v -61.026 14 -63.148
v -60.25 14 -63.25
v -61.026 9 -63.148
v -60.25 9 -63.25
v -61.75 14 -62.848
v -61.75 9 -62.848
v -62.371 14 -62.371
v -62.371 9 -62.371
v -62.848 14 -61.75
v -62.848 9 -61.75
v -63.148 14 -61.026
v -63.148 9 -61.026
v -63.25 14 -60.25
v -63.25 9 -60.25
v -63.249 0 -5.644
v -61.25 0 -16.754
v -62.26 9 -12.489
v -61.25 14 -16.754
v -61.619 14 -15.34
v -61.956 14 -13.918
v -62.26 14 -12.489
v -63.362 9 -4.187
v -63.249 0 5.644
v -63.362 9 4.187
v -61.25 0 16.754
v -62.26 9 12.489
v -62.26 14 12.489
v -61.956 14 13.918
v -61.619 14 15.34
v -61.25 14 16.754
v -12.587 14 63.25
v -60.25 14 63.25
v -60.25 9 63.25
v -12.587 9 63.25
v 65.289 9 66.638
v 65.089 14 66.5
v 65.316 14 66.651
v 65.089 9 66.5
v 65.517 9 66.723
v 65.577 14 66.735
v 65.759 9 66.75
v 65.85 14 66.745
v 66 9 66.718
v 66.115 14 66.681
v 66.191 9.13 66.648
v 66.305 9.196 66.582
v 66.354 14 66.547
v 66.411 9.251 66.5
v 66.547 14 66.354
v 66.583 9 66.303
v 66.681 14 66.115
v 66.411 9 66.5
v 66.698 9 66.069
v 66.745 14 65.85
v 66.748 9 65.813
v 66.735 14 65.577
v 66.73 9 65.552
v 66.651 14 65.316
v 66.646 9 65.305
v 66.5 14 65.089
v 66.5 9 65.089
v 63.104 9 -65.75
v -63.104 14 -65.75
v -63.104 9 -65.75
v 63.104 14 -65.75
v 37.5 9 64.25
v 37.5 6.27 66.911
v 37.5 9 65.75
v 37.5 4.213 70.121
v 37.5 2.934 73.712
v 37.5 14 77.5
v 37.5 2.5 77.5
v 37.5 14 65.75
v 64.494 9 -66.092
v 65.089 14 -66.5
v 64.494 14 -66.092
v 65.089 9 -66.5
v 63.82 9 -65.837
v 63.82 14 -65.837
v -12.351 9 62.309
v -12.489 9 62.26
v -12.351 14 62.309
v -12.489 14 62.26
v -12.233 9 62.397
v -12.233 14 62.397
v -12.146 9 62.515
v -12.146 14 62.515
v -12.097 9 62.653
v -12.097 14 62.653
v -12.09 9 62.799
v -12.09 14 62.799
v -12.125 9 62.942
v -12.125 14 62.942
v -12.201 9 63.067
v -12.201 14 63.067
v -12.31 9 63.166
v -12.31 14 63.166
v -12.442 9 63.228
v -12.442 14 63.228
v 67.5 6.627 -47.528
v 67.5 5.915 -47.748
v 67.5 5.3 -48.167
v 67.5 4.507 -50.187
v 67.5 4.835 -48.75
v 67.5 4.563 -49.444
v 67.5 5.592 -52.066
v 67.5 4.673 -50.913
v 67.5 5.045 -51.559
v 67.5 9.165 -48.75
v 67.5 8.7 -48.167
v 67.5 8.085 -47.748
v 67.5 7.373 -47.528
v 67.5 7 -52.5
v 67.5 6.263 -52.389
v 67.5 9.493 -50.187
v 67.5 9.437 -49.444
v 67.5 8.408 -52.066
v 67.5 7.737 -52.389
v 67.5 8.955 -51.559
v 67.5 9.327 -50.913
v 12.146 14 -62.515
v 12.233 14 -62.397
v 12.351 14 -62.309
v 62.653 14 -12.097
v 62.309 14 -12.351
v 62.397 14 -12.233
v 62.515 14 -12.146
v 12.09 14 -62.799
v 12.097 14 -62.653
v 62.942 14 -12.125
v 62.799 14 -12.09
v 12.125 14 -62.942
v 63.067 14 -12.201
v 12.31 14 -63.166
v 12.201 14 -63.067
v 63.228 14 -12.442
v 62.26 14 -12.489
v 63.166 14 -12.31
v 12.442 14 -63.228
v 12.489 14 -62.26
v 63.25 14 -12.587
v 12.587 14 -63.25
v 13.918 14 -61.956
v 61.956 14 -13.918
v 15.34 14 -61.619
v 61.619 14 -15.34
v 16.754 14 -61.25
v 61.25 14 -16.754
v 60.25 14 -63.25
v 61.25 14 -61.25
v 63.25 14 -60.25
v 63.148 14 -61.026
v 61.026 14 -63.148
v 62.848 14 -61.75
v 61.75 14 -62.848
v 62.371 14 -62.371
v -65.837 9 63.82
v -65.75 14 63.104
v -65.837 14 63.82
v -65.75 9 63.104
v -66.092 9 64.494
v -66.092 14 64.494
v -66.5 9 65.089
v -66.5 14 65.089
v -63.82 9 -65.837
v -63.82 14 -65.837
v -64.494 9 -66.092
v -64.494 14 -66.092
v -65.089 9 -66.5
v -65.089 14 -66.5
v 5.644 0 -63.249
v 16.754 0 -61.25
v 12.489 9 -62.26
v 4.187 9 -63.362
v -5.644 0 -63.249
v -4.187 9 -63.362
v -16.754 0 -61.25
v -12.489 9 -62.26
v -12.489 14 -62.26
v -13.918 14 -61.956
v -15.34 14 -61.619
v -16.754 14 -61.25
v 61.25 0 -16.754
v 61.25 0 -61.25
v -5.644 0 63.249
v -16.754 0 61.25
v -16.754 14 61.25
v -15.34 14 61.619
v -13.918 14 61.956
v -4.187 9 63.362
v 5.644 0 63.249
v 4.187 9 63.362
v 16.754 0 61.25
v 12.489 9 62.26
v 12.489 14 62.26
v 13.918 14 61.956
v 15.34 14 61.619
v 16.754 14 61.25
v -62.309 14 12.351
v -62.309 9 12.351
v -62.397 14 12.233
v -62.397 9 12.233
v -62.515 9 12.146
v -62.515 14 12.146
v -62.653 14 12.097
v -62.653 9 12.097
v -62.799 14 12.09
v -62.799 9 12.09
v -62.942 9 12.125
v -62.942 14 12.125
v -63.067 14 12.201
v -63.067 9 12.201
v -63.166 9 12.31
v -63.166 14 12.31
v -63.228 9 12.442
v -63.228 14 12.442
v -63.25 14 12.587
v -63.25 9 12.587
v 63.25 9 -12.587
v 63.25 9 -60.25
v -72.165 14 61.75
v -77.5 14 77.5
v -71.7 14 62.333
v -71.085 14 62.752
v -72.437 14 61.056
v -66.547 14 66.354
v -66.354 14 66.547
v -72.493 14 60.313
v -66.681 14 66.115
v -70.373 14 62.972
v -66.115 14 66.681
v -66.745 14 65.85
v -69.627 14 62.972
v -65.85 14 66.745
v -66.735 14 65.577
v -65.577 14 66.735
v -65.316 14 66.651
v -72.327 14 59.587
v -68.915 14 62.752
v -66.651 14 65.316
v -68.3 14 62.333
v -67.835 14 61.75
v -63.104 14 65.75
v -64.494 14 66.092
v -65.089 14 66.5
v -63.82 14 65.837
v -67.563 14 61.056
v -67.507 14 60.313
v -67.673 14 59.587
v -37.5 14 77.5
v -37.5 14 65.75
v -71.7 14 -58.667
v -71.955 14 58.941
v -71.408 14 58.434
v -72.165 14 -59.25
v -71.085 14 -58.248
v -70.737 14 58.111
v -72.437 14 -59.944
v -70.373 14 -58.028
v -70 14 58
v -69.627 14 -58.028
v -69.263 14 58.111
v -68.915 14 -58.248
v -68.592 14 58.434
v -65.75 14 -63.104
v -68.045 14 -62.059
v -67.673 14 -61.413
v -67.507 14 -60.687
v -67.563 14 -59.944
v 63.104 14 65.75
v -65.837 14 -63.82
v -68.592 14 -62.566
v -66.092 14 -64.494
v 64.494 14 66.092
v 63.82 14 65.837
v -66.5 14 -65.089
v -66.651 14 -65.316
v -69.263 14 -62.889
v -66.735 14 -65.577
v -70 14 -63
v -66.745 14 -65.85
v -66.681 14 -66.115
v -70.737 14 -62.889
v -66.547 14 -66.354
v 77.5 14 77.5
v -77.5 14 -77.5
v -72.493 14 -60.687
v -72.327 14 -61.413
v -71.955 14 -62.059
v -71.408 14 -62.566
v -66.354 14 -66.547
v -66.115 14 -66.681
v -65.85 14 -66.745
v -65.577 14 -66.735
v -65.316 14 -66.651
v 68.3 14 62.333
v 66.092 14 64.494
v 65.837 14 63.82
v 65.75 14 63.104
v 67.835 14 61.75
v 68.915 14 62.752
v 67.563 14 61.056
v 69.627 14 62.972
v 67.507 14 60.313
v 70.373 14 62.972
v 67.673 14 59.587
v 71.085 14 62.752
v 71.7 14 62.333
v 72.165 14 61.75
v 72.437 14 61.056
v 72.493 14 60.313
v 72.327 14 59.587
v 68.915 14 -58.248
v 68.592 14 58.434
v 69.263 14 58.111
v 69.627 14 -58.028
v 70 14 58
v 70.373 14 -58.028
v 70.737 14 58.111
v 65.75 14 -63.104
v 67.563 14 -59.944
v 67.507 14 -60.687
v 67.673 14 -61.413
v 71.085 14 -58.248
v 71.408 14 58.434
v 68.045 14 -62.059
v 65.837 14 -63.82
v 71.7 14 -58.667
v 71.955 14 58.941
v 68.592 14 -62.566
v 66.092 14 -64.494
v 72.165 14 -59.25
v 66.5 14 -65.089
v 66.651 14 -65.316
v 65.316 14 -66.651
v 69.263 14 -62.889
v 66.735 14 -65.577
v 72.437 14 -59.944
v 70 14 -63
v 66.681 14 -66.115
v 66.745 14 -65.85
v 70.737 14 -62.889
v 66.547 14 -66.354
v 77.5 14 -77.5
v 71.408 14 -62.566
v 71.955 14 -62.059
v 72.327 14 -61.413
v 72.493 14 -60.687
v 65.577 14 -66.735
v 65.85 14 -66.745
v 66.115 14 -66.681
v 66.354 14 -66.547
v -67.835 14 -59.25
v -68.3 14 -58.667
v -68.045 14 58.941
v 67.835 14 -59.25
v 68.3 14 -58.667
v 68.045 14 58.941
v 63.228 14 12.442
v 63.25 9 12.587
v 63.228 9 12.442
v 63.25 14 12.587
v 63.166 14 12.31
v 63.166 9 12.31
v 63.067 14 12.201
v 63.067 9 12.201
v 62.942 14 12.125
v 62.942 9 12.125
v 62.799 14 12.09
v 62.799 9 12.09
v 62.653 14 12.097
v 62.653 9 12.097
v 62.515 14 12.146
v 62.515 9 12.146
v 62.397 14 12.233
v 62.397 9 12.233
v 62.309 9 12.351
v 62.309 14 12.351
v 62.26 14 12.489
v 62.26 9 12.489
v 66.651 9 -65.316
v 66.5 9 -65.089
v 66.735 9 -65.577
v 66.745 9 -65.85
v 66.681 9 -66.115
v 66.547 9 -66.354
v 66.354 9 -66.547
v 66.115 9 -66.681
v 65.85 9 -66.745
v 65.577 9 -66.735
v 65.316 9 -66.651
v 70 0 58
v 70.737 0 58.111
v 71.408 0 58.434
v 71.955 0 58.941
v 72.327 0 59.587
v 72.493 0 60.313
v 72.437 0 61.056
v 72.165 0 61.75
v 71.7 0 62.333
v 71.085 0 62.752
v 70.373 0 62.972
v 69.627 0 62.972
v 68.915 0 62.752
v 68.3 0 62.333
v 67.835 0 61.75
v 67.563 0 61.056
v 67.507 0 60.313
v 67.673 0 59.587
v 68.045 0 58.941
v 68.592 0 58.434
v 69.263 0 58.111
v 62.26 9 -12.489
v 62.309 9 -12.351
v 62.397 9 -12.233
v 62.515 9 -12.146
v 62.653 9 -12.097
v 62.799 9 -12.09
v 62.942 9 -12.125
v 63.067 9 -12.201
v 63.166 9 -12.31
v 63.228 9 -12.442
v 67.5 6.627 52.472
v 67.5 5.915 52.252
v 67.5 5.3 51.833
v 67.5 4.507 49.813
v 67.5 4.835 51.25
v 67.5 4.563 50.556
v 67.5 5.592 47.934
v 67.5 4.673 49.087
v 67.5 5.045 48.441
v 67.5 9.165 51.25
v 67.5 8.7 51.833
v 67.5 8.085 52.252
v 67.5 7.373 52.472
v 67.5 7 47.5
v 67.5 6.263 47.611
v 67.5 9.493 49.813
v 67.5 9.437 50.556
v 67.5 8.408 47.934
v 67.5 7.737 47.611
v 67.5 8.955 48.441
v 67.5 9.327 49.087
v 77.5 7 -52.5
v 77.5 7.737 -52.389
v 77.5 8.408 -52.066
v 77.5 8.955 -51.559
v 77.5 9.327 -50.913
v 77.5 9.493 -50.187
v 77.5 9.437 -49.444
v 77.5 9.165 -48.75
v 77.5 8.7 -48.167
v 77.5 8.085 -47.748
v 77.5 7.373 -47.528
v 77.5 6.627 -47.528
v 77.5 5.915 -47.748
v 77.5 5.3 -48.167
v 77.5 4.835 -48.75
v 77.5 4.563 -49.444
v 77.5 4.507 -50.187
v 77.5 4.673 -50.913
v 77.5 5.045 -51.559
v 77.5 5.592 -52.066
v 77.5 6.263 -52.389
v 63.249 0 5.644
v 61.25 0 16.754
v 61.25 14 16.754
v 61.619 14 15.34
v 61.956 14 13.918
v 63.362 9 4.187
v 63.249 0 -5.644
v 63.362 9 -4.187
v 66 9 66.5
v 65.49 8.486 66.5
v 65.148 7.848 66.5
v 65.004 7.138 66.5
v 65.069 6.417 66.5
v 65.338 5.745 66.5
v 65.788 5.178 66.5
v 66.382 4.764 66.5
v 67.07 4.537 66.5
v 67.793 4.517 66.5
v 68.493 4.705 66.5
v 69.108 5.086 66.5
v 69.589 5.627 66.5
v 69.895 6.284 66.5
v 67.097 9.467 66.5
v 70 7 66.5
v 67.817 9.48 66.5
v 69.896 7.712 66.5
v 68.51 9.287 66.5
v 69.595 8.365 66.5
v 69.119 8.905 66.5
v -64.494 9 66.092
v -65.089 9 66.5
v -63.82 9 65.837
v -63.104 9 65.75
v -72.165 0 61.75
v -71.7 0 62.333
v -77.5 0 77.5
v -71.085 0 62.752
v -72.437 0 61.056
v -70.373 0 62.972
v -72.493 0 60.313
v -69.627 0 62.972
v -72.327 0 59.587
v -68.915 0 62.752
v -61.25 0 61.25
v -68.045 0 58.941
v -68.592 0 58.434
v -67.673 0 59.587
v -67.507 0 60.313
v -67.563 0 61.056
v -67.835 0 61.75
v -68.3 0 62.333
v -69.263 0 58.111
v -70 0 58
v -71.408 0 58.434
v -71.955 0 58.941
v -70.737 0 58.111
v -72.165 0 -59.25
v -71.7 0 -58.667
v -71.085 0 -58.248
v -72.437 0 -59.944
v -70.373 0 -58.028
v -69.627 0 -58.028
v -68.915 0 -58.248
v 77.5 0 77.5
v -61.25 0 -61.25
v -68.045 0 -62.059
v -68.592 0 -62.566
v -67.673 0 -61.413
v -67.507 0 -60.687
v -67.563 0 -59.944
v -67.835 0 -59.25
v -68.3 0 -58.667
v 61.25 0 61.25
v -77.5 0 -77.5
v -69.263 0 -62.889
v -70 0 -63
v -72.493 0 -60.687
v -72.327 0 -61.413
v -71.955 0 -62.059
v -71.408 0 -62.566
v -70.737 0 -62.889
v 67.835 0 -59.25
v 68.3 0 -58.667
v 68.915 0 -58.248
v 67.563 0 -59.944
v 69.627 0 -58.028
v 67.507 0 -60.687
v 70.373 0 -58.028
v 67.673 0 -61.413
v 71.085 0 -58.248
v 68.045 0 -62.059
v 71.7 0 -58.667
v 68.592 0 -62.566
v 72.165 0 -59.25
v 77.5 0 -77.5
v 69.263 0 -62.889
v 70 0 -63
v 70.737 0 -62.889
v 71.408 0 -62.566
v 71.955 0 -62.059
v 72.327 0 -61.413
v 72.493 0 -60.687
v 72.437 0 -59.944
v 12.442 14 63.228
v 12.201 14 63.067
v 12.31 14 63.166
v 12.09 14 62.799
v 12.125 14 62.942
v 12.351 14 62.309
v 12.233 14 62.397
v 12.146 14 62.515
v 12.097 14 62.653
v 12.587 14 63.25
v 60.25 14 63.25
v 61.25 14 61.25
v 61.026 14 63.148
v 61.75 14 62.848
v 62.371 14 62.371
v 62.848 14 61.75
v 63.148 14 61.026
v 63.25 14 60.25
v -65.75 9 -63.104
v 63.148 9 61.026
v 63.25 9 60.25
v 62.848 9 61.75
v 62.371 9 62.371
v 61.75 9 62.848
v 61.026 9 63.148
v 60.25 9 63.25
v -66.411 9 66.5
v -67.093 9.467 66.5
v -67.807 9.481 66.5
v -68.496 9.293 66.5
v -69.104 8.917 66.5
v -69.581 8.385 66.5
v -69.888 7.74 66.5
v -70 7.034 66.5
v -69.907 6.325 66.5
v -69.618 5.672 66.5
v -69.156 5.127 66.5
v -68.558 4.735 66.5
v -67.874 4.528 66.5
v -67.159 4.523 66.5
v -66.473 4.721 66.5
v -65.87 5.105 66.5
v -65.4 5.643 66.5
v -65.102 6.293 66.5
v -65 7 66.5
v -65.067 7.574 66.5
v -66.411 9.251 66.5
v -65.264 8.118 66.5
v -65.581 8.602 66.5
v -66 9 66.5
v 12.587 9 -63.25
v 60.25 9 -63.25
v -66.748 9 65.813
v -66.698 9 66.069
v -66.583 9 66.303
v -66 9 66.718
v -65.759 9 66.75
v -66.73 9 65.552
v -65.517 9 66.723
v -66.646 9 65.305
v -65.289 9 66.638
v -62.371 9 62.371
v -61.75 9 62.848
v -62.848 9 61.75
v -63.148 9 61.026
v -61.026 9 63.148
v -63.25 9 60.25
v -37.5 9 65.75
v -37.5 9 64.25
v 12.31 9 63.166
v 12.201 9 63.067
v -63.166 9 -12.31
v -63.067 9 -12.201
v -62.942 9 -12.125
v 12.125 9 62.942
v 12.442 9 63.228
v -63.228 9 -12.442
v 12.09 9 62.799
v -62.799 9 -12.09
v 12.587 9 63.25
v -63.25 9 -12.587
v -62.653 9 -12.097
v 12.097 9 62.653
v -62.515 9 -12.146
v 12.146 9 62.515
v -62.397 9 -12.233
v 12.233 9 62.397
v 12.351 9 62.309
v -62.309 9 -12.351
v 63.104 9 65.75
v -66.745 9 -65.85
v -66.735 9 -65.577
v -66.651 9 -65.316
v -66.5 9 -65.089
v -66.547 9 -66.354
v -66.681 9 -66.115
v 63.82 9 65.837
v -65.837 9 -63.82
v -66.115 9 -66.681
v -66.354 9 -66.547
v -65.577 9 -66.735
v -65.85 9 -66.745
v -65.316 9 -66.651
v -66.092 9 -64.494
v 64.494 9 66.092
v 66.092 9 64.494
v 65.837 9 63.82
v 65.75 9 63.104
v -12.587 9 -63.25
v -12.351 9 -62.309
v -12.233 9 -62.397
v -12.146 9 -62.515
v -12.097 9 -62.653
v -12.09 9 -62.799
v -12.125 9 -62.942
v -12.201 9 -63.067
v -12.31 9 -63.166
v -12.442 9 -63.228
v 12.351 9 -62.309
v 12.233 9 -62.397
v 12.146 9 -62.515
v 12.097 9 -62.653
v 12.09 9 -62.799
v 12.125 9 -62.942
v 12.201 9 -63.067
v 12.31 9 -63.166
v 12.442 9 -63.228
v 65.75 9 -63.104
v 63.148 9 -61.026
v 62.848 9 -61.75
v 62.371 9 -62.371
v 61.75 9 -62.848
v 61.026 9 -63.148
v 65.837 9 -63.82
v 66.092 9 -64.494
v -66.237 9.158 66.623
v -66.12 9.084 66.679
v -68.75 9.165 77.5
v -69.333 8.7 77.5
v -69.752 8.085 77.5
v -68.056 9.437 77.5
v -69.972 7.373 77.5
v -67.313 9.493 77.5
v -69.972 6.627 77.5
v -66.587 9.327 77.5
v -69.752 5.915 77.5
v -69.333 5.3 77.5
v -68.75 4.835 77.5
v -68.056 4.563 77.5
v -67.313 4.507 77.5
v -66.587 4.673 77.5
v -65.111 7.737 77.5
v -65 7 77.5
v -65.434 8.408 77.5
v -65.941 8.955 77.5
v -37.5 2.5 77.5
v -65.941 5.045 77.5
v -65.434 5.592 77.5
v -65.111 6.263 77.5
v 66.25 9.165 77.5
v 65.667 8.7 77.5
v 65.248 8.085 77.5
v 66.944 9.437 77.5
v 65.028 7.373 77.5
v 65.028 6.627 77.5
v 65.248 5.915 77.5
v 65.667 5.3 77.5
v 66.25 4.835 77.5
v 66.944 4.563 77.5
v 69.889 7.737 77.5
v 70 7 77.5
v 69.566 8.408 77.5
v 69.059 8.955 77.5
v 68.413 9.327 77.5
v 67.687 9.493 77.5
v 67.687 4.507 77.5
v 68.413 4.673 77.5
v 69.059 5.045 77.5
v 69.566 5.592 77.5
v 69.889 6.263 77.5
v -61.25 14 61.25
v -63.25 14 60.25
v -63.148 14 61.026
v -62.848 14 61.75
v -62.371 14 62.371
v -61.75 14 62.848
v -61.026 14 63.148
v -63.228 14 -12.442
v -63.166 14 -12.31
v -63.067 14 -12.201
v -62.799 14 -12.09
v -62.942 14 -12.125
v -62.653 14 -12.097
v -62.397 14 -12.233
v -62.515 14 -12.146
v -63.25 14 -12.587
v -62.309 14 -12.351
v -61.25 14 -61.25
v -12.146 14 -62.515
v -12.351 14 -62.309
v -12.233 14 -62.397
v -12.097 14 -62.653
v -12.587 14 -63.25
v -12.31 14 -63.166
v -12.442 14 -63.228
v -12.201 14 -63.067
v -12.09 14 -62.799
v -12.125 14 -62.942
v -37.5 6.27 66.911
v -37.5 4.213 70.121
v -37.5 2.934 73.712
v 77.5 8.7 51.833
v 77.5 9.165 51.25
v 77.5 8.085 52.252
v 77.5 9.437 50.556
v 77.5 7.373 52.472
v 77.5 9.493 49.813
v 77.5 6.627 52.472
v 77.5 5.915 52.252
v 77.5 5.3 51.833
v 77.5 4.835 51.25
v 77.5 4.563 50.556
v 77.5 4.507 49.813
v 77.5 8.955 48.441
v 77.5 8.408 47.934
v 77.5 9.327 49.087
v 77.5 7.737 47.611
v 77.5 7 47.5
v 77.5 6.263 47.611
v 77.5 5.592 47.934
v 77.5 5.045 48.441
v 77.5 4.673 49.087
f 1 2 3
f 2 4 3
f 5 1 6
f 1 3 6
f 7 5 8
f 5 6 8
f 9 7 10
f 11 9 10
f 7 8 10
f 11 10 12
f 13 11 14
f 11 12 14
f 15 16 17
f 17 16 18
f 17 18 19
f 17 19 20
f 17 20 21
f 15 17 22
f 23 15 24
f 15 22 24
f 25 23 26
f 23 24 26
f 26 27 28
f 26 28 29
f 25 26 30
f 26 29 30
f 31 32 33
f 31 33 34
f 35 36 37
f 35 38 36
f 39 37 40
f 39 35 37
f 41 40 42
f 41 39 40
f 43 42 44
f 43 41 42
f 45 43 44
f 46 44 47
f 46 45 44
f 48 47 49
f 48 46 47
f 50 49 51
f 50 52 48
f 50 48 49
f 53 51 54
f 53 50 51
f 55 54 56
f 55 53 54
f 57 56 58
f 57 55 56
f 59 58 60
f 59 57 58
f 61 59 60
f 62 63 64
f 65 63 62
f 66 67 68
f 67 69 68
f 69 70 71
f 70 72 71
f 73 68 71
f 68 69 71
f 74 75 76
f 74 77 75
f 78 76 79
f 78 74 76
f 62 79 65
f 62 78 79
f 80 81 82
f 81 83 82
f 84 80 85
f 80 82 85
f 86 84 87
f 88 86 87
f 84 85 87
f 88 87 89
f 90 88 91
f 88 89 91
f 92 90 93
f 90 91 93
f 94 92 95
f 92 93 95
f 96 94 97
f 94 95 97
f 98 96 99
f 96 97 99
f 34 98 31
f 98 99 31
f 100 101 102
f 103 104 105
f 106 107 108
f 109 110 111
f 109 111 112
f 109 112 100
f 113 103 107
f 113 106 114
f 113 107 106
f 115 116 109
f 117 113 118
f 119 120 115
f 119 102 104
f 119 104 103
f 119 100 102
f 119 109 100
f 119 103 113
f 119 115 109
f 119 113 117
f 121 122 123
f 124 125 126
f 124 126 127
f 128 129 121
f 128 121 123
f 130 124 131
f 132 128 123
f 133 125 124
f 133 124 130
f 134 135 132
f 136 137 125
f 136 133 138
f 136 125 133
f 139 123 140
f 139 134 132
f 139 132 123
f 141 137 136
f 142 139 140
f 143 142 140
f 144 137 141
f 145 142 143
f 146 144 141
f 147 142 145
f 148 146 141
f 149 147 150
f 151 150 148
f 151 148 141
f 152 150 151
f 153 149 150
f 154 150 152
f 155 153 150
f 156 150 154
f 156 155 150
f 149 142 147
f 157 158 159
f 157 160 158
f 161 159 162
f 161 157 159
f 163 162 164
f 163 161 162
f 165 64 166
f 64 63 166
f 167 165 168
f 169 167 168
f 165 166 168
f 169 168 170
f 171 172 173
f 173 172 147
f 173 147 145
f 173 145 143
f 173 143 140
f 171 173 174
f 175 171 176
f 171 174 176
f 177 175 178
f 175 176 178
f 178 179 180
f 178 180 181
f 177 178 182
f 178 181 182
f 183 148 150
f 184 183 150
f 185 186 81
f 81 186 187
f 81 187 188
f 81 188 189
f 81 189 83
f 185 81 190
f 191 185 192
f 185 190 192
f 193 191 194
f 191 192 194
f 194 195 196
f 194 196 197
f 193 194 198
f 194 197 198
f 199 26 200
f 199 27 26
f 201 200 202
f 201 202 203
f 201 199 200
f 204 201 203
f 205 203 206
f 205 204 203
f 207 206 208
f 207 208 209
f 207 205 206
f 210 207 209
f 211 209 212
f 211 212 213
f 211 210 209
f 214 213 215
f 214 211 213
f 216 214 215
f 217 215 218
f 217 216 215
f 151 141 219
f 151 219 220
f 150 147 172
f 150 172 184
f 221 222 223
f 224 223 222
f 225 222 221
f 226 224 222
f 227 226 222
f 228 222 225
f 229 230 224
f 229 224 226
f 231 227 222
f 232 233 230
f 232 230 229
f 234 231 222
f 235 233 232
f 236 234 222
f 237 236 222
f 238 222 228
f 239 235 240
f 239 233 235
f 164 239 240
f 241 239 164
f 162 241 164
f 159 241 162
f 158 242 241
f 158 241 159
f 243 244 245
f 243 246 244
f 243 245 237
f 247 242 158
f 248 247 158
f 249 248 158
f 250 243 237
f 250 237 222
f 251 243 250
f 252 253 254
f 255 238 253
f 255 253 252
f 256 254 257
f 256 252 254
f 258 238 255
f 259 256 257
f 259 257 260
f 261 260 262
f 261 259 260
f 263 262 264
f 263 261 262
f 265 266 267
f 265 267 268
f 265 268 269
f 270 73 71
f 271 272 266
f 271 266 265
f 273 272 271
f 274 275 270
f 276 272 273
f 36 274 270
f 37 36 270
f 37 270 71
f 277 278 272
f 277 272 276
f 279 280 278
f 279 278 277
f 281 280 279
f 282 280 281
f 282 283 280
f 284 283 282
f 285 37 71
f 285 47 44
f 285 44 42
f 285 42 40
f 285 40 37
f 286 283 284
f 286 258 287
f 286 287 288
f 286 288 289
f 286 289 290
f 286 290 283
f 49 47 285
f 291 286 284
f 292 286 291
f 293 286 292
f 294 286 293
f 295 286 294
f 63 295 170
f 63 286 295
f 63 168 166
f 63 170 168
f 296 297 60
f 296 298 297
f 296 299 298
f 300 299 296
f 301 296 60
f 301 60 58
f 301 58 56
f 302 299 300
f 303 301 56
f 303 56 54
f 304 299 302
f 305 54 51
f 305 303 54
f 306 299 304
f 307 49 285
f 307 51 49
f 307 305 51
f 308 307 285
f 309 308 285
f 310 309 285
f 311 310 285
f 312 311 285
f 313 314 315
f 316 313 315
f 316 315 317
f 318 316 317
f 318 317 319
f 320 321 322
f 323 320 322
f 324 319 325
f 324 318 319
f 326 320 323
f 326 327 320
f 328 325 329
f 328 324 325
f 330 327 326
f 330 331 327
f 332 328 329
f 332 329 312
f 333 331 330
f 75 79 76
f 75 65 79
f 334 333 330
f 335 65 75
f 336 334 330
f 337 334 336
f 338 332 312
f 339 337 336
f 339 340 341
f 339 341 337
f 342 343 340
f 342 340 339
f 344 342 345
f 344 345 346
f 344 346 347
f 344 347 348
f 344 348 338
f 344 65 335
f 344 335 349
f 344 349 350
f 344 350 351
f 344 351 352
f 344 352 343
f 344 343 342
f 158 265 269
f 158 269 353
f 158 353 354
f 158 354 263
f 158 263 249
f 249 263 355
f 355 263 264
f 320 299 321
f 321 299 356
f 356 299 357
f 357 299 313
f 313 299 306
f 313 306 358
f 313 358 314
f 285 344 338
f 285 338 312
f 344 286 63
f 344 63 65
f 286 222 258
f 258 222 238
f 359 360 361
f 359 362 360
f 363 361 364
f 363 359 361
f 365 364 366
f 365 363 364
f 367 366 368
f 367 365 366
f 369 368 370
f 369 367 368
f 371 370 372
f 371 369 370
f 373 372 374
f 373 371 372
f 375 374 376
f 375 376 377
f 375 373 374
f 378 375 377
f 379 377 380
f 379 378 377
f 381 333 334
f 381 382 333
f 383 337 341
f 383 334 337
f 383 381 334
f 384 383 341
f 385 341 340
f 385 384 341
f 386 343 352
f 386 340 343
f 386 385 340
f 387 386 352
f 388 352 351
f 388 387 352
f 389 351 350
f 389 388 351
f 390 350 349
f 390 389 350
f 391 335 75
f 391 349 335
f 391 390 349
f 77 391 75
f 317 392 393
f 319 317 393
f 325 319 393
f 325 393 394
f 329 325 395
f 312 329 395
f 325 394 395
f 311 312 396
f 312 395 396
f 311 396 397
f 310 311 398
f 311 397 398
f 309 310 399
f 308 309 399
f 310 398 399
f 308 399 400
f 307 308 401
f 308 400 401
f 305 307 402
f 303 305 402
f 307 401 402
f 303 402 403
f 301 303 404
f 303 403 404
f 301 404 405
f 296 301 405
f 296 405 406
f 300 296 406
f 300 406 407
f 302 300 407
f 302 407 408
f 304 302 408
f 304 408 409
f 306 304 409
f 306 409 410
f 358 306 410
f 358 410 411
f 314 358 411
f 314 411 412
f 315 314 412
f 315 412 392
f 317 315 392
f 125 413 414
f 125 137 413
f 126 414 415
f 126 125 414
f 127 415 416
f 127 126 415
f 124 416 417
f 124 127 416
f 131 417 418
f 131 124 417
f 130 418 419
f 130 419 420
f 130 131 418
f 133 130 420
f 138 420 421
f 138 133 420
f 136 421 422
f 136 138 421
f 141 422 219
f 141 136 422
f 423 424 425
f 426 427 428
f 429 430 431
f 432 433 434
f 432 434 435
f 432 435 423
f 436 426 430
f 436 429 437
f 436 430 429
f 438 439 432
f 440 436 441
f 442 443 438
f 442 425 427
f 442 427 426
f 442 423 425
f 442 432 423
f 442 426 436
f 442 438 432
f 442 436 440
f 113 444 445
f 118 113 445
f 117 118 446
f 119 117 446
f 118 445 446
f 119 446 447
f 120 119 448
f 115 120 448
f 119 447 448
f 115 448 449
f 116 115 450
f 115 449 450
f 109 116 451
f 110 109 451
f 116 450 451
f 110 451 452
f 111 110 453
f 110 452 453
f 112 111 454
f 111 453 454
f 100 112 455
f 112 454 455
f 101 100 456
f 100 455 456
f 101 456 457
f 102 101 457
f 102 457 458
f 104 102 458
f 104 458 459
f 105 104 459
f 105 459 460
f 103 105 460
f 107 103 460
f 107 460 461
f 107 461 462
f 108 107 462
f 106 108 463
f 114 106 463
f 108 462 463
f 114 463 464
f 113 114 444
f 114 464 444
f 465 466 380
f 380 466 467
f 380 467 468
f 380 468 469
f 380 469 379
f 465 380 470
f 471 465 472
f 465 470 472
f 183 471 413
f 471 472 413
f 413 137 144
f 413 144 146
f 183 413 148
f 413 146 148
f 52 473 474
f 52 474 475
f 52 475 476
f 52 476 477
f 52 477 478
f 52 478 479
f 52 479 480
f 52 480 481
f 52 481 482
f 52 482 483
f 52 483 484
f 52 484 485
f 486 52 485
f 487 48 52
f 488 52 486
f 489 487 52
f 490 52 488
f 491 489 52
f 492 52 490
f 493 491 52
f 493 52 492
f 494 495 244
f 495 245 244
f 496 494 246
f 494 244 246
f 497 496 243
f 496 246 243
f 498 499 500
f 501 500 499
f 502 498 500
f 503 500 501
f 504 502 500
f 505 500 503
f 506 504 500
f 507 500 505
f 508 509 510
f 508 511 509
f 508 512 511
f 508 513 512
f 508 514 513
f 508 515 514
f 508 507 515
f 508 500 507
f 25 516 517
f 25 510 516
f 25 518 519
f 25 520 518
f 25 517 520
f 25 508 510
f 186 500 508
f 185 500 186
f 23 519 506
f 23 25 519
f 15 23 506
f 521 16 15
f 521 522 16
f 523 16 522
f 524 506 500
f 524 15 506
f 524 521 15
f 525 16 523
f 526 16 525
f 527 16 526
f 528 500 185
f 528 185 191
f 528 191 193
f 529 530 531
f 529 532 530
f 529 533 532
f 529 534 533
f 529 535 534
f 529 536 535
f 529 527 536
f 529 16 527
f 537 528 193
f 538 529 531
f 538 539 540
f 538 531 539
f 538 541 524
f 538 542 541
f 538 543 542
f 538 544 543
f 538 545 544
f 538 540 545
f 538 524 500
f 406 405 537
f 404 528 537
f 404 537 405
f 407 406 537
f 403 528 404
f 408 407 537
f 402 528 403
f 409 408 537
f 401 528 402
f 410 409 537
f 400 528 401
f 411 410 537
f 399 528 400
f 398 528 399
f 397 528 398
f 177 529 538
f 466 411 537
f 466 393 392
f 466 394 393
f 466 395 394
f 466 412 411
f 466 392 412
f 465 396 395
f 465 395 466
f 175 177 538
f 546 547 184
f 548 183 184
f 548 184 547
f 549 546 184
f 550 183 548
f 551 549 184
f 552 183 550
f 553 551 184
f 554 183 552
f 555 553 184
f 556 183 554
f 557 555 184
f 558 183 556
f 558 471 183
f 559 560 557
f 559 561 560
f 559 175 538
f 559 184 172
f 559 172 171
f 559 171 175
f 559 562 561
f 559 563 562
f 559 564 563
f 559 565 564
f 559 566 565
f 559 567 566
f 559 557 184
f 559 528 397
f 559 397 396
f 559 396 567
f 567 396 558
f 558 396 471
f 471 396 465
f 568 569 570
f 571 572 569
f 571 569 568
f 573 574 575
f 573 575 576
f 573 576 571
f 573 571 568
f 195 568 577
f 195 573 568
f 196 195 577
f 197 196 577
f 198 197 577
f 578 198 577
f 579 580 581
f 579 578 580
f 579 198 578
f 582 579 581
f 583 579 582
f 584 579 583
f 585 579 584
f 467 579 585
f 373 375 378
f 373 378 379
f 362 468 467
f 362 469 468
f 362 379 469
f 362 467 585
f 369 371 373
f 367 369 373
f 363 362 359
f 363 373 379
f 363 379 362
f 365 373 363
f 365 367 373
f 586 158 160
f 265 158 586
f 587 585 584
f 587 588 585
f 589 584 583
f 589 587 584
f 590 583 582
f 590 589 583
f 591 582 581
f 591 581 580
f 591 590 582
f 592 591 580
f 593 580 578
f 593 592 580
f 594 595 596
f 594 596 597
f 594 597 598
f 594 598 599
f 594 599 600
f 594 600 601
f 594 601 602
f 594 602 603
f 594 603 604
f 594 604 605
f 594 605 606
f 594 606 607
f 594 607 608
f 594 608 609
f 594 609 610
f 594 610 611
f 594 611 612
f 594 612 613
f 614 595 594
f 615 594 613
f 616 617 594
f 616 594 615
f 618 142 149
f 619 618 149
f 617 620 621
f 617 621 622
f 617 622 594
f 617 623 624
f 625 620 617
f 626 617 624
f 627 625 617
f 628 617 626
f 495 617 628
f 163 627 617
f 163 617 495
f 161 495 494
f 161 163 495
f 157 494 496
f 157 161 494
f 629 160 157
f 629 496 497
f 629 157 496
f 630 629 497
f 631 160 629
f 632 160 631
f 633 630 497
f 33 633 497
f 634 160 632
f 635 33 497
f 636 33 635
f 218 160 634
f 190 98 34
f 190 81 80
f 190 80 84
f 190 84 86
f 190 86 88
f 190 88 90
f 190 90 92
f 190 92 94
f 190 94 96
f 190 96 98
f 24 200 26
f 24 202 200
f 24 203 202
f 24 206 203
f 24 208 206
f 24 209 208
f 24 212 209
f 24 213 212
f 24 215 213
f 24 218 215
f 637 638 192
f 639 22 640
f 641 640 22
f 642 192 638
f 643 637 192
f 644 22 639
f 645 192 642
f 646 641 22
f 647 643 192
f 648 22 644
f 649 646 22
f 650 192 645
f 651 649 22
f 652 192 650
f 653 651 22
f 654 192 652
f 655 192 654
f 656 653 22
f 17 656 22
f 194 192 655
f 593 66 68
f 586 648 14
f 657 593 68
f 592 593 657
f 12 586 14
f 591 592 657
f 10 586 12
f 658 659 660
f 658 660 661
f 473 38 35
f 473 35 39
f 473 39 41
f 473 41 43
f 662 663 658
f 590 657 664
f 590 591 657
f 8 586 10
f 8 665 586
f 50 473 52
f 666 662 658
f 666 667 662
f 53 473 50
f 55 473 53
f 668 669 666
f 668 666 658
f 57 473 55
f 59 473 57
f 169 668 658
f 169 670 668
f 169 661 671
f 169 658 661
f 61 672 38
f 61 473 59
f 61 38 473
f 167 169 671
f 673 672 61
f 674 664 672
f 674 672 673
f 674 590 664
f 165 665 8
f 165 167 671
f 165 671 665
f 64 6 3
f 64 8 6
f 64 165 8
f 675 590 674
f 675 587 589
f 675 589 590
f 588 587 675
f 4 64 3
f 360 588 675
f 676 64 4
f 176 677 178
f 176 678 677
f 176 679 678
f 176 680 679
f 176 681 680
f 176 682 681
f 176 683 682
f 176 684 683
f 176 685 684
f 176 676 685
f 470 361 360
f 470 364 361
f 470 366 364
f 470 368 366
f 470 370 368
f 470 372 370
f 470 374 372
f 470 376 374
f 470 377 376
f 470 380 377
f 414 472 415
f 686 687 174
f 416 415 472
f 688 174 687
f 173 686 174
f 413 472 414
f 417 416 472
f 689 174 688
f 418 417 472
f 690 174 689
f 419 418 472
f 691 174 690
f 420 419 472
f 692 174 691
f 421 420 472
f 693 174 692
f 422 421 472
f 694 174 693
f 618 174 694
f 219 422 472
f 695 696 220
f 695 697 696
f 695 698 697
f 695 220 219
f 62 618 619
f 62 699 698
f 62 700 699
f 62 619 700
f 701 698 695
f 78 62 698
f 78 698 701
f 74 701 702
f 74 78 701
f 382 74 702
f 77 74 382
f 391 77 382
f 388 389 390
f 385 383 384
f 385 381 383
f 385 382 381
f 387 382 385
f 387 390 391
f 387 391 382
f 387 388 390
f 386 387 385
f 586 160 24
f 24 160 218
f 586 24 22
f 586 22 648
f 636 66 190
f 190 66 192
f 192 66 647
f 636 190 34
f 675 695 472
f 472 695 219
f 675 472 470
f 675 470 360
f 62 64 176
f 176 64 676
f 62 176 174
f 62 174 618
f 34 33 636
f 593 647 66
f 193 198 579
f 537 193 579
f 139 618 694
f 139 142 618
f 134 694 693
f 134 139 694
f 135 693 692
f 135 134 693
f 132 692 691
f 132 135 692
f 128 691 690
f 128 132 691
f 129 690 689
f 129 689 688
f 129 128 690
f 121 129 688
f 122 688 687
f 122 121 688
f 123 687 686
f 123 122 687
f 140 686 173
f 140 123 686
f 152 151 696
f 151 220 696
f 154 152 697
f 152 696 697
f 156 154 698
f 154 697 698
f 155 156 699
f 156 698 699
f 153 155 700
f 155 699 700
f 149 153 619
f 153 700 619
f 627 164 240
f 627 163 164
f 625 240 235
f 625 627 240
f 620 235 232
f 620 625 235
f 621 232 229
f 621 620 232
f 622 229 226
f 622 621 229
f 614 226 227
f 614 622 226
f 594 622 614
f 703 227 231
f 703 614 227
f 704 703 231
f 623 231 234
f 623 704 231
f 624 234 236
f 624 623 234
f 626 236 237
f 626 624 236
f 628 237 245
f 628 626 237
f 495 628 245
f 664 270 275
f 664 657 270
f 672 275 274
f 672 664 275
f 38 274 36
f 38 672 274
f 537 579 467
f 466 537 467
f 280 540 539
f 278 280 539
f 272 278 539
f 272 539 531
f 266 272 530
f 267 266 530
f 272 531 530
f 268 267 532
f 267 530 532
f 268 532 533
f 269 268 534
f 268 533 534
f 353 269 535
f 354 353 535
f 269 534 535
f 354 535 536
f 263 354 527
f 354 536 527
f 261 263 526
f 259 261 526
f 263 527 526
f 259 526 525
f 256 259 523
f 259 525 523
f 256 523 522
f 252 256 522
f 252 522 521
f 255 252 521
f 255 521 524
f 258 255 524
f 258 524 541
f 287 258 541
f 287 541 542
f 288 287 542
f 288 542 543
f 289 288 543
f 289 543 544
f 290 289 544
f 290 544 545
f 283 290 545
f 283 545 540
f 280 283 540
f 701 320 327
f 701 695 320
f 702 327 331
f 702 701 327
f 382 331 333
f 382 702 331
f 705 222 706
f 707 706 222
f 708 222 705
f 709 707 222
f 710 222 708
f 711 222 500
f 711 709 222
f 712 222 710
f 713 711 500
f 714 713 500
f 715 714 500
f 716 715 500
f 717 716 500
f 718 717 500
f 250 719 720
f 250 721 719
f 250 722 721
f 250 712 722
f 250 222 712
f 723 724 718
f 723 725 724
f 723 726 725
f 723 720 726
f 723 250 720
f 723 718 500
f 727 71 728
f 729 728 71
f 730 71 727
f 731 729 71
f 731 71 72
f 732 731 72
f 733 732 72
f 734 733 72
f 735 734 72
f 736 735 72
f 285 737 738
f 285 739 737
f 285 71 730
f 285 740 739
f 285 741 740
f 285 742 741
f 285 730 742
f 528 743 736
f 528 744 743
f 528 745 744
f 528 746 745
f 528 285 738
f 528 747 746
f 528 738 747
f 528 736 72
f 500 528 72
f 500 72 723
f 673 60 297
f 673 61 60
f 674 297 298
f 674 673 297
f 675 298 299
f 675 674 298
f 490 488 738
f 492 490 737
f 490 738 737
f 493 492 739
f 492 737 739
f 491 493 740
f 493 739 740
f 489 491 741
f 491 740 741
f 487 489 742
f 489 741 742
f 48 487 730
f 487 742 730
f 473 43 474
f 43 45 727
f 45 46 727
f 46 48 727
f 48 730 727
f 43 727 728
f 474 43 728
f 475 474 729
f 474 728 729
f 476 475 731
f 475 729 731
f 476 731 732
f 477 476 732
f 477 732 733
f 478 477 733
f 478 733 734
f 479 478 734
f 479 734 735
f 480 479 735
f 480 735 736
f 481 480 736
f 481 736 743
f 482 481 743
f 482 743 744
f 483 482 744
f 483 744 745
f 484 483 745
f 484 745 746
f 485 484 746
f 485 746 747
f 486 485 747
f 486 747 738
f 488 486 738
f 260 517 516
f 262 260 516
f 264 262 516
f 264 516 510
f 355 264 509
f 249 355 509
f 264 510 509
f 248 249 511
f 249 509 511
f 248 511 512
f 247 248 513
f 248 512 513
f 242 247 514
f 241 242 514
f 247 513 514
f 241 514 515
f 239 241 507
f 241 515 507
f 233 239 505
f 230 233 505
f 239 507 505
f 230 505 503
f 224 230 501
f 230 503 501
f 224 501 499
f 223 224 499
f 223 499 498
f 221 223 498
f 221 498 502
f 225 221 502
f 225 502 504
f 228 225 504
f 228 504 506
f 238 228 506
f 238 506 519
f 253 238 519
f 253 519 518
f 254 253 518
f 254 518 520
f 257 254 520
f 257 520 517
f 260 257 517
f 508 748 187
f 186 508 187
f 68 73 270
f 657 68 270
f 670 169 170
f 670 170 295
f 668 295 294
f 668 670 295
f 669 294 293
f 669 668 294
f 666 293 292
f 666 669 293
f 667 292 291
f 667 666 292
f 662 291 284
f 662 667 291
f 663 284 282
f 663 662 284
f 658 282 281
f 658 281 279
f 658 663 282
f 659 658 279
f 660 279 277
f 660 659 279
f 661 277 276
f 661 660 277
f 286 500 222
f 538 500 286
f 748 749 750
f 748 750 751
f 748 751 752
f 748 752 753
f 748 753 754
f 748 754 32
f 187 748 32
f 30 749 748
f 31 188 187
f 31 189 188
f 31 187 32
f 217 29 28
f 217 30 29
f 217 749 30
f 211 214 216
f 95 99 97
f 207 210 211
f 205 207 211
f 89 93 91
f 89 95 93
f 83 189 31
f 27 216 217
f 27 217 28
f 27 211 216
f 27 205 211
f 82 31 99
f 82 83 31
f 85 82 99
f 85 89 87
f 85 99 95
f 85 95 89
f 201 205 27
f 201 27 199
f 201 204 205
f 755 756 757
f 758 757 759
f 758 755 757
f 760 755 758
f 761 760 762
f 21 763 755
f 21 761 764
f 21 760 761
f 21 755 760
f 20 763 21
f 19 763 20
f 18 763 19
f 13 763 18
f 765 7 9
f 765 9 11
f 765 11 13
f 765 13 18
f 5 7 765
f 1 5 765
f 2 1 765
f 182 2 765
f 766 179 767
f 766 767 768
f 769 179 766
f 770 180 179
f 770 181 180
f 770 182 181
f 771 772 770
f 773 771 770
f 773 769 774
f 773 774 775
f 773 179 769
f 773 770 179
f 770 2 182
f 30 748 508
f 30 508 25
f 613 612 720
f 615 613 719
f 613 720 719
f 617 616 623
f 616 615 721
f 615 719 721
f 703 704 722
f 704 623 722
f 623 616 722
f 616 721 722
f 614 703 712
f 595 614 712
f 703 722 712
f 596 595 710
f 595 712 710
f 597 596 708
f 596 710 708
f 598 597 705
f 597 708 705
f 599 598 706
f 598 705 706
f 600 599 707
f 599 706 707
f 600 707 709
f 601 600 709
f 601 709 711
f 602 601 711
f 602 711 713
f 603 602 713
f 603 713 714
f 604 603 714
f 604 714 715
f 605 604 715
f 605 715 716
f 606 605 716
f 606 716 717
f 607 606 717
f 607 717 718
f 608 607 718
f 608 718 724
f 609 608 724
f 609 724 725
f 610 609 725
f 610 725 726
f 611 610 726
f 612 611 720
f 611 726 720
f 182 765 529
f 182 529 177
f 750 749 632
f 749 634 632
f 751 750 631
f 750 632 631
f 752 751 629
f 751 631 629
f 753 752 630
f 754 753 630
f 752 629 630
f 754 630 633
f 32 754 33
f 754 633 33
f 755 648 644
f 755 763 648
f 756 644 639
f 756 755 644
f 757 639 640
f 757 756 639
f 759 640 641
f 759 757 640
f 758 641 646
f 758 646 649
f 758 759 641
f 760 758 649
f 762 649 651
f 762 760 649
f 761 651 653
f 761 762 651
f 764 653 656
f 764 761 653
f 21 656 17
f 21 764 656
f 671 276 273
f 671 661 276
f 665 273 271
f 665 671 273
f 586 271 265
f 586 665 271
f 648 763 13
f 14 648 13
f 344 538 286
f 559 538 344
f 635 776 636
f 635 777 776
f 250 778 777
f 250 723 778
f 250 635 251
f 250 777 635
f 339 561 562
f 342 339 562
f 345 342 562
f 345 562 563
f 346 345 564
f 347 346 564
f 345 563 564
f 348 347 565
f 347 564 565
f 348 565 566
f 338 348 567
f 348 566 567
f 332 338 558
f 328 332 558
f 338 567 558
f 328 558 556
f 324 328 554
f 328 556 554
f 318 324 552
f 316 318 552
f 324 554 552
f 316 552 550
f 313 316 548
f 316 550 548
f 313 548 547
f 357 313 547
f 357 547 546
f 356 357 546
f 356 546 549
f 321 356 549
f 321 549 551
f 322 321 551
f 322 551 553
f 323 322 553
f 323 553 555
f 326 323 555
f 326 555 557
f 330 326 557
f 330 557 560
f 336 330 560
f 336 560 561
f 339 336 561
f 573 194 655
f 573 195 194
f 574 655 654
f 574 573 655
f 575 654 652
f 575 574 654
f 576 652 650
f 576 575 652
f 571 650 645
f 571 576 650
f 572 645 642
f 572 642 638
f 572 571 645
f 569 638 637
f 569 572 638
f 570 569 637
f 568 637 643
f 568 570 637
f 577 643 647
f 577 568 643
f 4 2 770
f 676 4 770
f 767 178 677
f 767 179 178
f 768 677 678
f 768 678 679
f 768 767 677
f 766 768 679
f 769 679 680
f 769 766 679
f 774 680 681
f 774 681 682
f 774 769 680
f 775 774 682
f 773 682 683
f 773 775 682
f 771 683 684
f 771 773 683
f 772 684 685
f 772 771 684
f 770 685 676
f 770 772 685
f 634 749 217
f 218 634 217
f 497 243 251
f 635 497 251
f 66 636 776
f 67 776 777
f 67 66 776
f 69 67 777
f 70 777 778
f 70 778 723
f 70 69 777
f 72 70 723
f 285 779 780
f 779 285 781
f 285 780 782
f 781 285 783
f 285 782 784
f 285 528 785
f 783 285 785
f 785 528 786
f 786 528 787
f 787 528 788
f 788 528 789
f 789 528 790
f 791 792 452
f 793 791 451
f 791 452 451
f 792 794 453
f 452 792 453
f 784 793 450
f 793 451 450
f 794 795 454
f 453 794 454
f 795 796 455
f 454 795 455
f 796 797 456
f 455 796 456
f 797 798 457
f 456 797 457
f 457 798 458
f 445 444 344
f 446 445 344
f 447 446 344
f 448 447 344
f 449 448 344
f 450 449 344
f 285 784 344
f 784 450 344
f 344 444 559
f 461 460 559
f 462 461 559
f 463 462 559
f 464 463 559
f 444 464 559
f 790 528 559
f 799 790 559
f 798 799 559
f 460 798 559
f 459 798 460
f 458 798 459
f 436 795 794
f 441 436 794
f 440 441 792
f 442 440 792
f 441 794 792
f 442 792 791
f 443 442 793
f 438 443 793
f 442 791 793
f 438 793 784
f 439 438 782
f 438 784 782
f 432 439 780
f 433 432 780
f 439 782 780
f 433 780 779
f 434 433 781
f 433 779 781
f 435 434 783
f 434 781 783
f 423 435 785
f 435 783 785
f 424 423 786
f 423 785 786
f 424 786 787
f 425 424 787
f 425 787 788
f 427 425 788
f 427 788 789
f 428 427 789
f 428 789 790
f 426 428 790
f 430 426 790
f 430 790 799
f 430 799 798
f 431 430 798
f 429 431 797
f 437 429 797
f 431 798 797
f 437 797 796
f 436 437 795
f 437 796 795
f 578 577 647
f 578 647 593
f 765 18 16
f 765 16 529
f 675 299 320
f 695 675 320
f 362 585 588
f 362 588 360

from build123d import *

# Parameters (mm, degrees)
SKETCH1_W           = 155
SKETCH1_H           = 155
BOSS_EXTRUDE1_DEPTH = 14
SKETCH2_W           = 131.5
SKETCH2_H           = 131.5
SKETCH2_W_2         = 126.5
SKETCH2_H_2         = 126.5
CUT_EXTRUDE1_DEPTH  = 5
SKETCH3_W           = 122.5
SKETCH3_H           = 122.5
CUT_EXTRUDE2_DEPTH  = 111.492081164
SKETCH6_R           = 2.5
CUT_EXTRUDE5_DEPTH  = 11
SKETCH7_R           = 2.5
CUT_EXTRUDE6_DEPTH  = 111.492081164
SKETCH8_W           = 75
SKETCH8_H           = 14
CUT_EXTRUDE7_DEPTH  = 13.25
CUT_EXTRUDE8_START  = -5
SKETCH9_R           = 1
CUT_EXTRUDE8_DEPTH  = 5
FILLET1_R           = 3
SKETCH10_R          = 2.5
CUT_EXTRUDE9_DEPTH  = 10
BOSS_EXTRUDE2_DEPTH = 75
SKETCH11_R          = 63.5
CUT_EXTRUDE10_DEPTH = 111.492081234
FILLET2_R           = 0.5


with BuildPart() as part:
    # Sketch1 → Boss-Extrude1 (new body)
    with BuildSketch(Plane(origin=(0, 0, 0), x_dir=(1, 0, 0), z_dir=(0, 1, 0))):
        Rectangle(SKETCH1_W, SKETCH1_H)
    extrude(amount=BOSS_EXTRUDE1_DEPTH)

    # Sketch2 → Cut-Extrude1 (cut)
    with BuildSketch(Plane(origin=(0, 14, 0), x_dir=(1, 0, 0), z_dir=(0, 1, 0))):
        Rectangle(SKETCH2_W, SKETCH2_H)
        Rectangle(SKETCH2_W_2, SKETCH2_H_2, mode=Mode.SUBTRACT)
    extrude(amount=-CUT_EXTRUDE1_DEPTH, mode=Mode.SUBTRACT)

    # Sketch3 → Cut-Extrude2 (cut, through all)
    with BuildSketch(Plane(origin=(0, 14, 0), x_dir=(1, 0, 0), z_dir=(0, 1, 0))):
        Rectangle(SKETCH3_W, SKETCH3_H)
    extrude(amount=-CUT_EXTRUDE2_DEPTH, mode=Mode.SUBTRACT)

    # Sketch6 → Cut-Extrude5 (cut)
    with BuildSketch(Plane.XY.offset(77.5)):
        with Locations((67.5, 7)):
            Circle(SKETCH6_R)
        with Locations((-67.5, 7)):
            Circle(SKETCH6_R)
    extrude(amount=-CUT_EXTRUDE5_DEPTH, mode=Mode.SUBTRACT)

    # Sketch7 → Cut-Extrude6 (cut, through all)
    with BuildSketch(Plane.XZ):
        with Locations(Location((70, -60.5, 0), (0, 0, 270))):
            Circle(SKETCH7_R)
        with Locations(Location((70, 60.5, 0), (0, 0, 270))):
            Circle(SKETCH7_R)
        with Locations(Location((-70, 60.5, 0), (0, 0, 270))):
            Circle(SKETCH7_R)
        with Locations(Location((-70, -60.5, 0), (0, 0, 270))):
            Circle(SKETCH7_R)
    extrude(amount=-CUT_EXTRUDE6_DEPTH, mode=Mode.SUBTRACT)

    # Sketch8 → Cut-Extrude7 (cut)
    with BuildSketch(Plane.XY.offset(77.5)):
        with Locations((0, 7)):
            Rectangle(SKETCH8_W, SKETCH8_H)
    extrude(amount=-CUT_EXTRUDE7_DEPTH, mode=Mode.SUBTRACT)

    # Sketch9 → Cut-Extrude8 (cut)
    with BuildSketch(Plane(origin=(0, 14, 0), x_dir=(1, 0, 0), z_dir=(0, 1, 0)).offset(CUT_EXTRUDE8_START)):
        with Locations((-65.75, 65.75)):
            Circle(SKETCH9_R)
        with Locations((65.75, 65.75)):
            Circle(SKETCH9_R)
        with Locations((65.75, -65.75)):
            Circle(SKETCH9_R)
        with Locations((-65.75, -65.75)):
            Circle(SKETCH9_R)
    extrude(amount=CUT_EXTRUDE8_DEPTH, mode=Mode.SUBTRACT)

    # Fillet1
    fillet1_edges = [part.edges().sort_by_distance(p)[0] for p in [
        (-64.75, 11.5, 65.75),
        (-65.75, 11.5, 64.75),
        (64.75, 11.5, 65.75),
        (65.75, 11.5, 64.75),
        (64.75, 11.5, -65.75),
        (65.75, 11.5, -64.75),
        (-65.75, 11.5, -64.75),
        (-64.75, 11.5, -65.75),
        (-63.25, 11.5, -63.25),
        (63.25, 11.5, -63.25),
        (63.25, 11.5, 63.25),
        (-63.25, 11.5, 63.25),
    ]]
    fillet(fillet1_edges, radius=FILLET1_R)

    # Sketch10 → Cut-Extrude9 (cut)
    with BuildSketch(Plane(origin=(77.5, 0, 0), x_dir=(0, 0, -1), z_dir=(1, 0, 0))):
        with Locations((50, 7)):
            Circle(SKETCH10_R)
        with Locations((-50, 7)):
            Circle(SKETCH10_R)
    extrude(amount=-CUT_EXTRUDE9_DEPTH, mode=Mode.SUBTRACT)

    # Sketch12 → Boss-Extrude2 (add)
    with BuildSketch(Plane.ZY.offset(-37.5)):
        with BuildLine():
            Line((77.5, 2.5), (77.5, 0))
            Line((77.5, 0), (64.25, 0))
            Line((64.25, 0), (64.25, 9))
            ThreePointArc((64.25, 9), (70.120763928, 4.212518777), (77.5, 2.5))
        make_face()
    extrude(amount=BOSS_EXTRUDE2_DEPTH)

    # Sketch11 → Cut-Extrude10 (cut, through all)
    with BuildSketch(Plane(origin=(0, 14, 0), x_dir=(1, 0, 0), z_dir=(0, 1, 0))):
        Circle(SKETCH11_R)
    extrude(amount=-CUT_EXTRUDE10_DEPTH, mode=Mode.SUBTRACT)

    # Fillet2
    fillet2_edges = [part.edges().sort_by_distance(p)[0] for p in [
        (-63.25, 11.5, 5.629165125),
        (-63.25, 11.5, -5.629165125),
        (-5.629165125, 11.5, -63.25),
        (5.629165125, 11.5, -63.25),
        (63.25, 11.5, -5.629165125),
        (63.25, 11.5, 5.629165125),
        (5.629165125, 11.5, 63.25),
        (-5.629165125, 11.5, 63.25),
    ]]
    fillet(fillet2_edges, radius=FILLET2_R)


solid = part.part
